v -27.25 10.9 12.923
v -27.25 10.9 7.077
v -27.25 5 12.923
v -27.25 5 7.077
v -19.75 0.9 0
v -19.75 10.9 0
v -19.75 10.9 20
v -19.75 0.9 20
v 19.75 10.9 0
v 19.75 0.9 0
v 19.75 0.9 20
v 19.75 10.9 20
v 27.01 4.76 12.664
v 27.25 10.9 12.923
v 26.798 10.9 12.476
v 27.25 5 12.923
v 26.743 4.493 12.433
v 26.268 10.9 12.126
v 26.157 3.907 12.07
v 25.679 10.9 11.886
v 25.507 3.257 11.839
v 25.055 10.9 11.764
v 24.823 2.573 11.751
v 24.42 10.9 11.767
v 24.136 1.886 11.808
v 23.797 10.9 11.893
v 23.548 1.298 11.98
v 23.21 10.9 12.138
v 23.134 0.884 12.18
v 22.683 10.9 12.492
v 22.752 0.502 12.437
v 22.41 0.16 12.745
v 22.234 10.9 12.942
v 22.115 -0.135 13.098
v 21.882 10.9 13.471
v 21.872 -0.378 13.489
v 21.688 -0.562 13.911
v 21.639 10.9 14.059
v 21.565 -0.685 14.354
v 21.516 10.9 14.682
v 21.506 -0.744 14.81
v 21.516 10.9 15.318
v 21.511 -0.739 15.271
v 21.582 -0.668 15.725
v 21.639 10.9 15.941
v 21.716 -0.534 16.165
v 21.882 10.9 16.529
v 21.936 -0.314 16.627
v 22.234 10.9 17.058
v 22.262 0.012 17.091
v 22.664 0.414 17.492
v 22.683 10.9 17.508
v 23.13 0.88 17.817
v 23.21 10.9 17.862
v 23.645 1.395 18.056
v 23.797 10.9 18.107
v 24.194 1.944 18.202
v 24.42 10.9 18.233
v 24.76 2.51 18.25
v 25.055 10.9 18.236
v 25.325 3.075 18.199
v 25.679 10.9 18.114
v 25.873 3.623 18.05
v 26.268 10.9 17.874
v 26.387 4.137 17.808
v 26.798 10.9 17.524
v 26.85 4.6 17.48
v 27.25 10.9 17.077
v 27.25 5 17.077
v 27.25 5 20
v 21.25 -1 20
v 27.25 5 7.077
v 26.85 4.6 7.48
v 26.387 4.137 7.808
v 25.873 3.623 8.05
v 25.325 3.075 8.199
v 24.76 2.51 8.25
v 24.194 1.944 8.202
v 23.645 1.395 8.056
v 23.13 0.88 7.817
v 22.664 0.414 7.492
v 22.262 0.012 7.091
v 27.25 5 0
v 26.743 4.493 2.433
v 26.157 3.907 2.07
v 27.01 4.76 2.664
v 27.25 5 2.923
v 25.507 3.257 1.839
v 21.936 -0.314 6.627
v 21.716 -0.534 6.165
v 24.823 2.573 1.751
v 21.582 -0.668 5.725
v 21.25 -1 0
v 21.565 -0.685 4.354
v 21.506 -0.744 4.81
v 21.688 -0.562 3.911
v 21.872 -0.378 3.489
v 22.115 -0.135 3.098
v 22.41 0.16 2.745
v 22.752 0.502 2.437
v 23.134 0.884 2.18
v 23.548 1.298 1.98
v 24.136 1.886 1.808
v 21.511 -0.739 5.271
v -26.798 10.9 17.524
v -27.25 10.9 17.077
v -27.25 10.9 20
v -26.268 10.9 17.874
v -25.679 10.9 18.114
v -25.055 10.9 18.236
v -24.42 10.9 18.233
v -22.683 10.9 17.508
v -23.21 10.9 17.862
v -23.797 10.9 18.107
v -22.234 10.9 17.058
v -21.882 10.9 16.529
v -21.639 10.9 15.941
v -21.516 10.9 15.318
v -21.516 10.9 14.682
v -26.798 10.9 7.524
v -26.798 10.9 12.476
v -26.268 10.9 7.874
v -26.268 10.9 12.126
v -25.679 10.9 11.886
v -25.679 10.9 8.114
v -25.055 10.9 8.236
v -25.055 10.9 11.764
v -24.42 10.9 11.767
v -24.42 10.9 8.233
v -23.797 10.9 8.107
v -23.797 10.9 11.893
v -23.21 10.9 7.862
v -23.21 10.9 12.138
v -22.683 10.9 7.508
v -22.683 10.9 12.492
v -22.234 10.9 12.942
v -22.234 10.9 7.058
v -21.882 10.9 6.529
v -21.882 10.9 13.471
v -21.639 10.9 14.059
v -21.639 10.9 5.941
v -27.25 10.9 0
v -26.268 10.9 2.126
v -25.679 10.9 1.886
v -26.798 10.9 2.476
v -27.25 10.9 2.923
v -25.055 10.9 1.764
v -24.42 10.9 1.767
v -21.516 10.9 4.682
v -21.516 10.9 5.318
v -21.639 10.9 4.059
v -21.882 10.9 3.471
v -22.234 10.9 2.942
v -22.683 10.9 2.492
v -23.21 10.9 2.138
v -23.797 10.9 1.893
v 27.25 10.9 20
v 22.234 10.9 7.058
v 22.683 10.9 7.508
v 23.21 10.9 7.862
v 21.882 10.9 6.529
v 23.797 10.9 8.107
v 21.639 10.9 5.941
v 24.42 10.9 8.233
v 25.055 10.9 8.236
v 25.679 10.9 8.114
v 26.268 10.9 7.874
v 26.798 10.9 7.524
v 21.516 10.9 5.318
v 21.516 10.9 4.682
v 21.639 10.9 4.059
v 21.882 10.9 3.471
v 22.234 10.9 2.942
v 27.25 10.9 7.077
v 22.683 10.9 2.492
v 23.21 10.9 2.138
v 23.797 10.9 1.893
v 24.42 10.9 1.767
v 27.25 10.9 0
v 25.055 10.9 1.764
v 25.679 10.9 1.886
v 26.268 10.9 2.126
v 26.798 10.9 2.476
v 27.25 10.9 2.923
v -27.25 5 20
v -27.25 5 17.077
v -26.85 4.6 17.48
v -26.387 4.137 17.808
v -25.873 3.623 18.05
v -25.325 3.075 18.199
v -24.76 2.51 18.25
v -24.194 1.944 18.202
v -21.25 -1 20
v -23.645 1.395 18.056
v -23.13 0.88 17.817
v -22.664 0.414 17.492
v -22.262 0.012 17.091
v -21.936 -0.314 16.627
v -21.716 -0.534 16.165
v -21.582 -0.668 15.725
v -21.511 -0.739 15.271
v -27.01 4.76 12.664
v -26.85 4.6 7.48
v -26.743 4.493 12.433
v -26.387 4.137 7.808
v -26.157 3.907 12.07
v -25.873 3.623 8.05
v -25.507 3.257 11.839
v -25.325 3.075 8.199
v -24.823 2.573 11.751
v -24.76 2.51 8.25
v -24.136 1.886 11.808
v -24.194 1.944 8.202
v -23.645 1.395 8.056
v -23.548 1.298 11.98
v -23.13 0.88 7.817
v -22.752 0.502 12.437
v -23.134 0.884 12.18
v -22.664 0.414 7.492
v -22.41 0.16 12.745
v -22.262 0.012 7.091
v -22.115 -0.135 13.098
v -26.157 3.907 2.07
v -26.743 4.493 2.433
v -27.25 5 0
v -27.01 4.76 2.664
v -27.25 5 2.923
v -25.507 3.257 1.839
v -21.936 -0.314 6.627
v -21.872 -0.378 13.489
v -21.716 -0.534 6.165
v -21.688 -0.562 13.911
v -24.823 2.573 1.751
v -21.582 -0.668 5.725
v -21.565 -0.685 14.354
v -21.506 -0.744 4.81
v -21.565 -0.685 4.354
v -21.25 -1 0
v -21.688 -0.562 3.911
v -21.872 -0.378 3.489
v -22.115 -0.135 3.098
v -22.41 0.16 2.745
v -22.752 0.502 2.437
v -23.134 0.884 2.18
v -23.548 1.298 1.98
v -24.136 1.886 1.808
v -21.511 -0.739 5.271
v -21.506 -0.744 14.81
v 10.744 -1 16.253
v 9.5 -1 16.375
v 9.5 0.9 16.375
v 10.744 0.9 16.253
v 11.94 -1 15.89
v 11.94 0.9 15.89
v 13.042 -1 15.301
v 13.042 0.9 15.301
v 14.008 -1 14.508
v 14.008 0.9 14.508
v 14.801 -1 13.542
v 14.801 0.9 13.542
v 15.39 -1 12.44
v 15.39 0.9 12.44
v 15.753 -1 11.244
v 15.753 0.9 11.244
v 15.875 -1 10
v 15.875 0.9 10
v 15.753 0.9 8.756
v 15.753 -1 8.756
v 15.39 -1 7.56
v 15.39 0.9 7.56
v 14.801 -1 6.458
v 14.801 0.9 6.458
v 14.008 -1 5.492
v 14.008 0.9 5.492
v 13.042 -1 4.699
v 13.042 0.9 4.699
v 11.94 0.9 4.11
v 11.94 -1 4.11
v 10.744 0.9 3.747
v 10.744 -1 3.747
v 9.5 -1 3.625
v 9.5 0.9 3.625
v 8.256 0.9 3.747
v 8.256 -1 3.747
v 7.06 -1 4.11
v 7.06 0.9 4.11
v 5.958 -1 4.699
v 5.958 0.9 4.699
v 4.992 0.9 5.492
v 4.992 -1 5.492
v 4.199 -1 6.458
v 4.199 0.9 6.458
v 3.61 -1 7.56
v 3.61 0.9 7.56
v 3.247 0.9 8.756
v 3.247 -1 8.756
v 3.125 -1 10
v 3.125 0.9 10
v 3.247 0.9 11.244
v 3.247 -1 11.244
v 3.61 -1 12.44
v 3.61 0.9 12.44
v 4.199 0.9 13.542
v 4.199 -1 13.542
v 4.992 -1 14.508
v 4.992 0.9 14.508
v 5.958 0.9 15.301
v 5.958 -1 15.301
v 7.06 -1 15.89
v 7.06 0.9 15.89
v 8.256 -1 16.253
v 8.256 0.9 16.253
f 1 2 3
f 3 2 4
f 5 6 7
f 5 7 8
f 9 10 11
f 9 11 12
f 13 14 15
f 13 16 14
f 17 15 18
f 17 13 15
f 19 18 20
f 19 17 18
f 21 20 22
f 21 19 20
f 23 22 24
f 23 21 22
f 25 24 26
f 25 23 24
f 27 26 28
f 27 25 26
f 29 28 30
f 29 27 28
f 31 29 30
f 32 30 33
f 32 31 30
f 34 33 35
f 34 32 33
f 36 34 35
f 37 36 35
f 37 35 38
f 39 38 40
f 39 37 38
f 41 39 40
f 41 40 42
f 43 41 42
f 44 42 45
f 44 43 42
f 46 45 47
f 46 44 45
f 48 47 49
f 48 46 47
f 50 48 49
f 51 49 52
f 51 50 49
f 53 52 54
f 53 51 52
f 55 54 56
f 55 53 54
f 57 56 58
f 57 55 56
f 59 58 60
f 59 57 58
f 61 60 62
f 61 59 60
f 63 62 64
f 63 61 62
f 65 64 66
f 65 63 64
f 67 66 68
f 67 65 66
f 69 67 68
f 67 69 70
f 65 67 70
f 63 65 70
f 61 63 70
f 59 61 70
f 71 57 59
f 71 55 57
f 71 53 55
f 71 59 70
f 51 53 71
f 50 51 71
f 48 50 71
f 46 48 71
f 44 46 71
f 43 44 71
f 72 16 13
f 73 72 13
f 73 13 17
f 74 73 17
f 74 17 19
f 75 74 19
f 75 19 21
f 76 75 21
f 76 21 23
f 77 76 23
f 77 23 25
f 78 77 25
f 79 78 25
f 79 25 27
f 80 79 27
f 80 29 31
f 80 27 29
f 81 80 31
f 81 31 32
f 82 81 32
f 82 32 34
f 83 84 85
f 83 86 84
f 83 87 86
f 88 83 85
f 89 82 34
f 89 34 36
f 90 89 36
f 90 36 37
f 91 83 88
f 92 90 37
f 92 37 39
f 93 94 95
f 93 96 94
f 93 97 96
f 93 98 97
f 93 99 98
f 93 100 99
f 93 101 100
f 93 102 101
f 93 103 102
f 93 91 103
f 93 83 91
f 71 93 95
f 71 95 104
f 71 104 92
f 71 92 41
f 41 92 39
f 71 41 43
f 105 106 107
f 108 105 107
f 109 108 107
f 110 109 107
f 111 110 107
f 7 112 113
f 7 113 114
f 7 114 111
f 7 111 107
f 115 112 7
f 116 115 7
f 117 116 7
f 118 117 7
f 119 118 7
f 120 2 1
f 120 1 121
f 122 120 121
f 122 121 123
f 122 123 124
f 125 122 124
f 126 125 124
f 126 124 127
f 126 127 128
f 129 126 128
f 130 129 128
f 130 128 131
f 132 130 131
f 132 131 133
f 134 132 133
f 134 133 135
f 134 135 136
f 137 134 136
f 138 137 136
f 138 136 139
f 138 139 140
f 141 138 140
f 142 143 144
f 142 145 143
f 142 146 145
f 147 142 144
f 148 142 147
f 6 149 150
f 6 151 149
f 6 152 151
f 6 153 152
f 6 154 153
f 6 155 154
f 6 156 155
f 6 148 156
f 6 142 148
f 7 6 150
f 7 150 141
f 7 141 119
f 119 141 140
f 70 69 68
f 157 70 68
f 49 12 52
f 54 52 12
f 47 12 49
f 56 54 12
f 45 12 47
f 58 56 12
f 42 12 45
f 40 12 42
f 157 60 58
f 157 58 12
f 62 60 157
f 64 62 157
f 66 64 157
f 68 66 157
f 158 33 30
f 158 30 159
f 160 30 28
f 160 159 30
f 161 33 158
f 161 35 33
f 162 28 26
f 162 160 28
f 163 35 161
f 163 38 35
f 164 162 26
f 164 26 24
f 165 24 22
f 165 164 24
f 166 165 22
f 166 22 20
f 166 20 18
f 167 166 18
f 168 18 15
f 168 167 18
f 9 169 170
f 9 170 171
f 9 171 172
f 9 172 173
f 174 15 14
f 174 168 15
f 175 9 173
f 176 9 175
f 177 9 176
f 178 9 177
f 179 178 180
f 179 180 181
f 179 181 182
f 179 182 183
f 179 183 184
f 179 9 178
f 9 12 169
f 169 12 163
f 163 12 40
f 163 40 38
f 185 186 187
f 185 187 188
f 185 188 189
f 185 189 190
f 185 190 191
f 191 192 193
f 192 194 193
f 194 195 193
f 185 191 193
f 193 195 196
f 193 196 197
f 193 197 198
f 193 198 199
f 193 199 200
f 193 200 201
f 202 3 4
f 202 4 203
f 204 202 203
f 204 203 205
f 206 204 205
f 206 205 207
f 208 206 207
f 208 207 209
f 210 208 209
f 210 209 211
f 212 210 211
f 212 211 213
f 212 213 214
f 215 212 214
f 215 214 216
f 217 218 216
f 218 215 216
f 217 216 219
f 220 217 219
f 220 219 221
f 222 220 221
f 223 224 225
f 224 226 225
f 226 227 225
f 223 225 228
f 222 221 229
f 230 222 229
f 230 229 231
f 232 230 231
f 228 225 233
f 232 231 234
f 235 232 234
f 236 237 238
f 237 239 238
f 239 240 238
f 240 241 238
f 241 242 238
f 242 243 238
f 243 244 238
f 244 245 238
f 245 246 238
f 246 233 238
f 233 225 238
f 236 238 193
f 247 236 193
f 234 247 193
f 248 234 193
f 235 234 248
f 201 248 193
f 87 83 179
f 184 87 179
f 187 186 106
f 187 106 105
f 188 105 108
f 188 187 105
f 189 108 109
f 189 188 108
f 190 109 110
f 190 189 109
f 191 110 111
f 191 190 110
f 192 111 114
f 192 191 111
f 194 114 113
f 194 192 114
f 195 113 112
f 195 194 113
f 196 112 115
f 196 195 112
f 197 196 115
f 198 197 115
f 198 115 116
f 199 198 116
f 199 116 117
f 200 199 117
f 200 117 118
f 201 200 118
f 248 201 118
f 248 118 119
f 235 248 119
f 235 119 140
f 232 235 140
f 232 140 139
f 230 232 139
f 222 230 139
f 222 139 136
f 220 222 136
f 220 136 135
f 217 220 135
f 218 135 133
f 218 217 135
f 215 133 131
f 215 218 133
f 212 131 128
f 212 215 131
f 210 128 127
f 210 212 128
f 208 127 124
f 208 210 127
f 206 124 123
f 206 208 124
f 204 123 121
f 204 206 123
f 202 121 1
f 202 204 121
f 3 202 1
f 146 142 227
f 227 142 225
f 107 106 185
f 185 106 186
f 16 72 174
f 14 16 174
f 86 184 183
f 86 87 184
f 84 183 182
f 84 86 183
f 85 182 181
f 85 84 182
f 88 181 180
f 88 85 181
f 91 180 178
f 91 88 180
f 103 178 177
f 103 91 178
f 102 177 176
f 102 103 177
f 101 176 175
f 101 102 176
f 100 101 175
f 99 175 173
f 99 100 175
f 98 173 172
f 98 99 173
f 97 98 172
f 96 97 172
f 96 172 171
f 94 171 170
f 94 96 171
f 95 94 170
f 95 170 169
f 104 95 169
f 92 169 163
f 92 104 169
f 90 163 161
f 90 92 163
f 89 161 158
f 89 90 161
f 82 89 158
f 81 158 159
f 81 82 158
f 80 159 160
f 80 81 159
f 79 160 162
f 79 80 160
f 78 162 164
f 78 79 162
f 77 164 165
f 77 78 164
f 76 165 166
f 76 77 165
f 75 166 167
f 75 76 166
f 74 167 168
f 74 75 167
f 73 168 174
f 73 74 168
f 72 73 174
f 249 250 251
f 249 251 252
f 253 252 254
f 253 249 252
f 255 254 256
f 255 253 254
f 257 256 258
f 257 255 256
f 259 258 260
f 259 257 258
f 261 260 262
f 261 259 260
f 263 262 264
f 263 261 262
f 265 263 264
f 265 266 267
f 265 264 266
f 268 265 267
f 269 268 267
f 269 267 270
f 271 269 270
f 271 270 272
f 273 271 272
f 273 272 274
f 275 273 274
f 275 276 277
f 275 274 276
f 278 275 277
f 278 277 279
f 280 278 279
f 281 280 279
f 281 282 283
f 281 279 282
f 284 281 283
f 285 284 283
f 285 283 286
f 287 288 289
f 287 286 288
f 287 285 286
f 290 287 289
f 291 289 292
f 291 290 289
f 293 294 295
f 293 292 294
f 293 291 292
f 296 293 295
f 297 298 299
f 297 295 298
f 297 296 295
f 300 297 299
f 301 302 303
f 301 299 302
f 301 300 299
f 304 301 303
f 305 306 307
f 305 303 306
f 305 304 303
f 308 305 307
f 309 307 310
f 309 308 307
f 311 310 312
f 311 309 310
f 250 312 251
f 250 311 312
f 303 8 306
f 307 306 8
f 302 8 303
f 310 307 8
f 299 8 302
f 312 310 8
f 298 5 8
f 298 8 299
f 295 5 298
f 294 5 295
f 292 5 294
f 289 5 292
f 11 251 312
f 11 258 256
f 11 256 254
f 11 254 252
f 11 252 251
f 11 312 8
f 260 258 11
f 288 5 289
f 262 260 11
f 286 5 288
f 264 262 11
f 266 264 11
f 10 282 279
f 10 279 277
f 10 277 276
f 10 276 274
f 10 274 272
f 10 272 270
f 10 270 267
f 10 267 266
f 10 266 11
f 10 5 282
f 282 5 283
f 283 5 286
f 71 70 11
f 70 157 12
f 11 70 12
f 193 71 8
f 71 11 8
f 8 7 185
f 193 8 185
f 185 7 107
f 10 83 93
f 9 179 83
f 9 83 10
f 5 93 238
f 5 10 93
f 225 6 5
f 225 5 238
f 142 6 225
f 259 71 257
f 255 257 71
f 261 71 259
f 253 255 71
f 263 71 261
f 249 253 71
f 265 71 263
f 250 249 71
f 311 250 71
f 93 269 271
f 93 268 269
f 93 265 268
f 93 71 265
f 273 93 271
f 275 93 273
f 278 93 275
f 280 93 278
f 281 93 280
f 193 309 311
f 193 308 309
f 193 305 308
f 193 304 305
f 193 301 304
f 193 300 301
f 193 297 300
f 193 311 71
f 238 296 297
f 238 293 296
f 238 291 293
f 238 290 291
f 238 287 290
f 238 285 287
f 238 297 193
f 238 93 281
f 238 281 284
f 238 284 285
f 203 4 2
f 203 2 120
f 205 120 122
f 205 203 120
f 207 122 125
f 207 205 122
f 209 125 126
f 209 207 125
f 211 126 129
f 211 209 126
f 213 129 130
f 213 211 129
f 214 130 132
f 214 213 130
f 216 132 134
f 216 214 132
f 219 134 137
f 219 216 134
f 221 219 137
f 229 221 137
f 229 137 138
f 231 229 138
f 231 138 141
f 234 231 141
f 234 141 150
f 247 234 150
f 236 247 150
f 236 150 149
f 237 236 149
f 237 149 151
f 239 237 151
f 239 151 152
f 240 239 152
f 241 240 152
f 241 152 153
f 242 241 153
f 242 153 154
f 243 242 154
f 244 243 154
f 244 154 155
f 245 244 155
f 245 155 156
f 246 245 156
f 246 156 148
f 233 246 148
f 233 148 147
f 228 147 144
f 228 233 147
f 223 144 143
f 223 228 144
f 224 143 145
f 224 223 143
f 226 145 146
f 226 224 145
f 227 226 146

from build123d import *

# Parameters (mm, degrees)
BOSS_EXTRUDE1_DEPTH     = 20
CUT_EXTRUDE2_DEPTH      = 36.51580634
CUT_EXTRUDE2_DEPTH_BACK = 36.51580634
SKETCH2_R               = 3.25
CHAMFER1_SIZE           = 6
CUT_EXTRUDE3_DEPTH      = 36.51580634
CUT_EXTRUDE3_DEPTH_BACK = 36.51580634
SKETCH3_R               = 6.375


with BuildPart() as part:
    # Sketch1 → Boss-Extrude1 (new body)
    with BuildSketch(Plane.XY):
        Polygon((-27.25, 1), (-27.25, 10.9), (-19.75, 10.9), (-19.75, 0.9), (19.75, 0.9), (19.75, 10.9), (27.25, 10.9), (27.25, 1), (27.25, -1), (-27.25, -1), align=None)
    extrude(amount=BOSS_EXTRUDE1_DEPTH)

    # Sketch2 → Cut-Extrude2 (cut, two sides: drawn at the far end of the back side and taken through both)
    with BuildSketch(Plane(origin=(0, 0, 0), x_dir=(1, 0, 0), z_dir=(0, 1, 0)).offset(-CUT_EXTRUDE2_DEPTH_BACK)):
        with Locations((-24.75, -5)):
            Circle(SKETCH2_R)
        with Locations((24.75, -5)):
            Circle(SKETCH2_R)
        with Locations((24.75, -15)):
            Circle(SKETCH2_R)
        with Locations((-24.75, -15)):
            Circle(SKETCH2_R)
    extrude(amount=CUT_EXTRUDE2_DEPTH + CUT_EXTRUDE2_DEPTH_BACK, mode=Mode.SUBTRACT)

    # Chamfer1
    # the kernel refuses this chamfer: 6 mm, written as the material it takes off along each edge
    with BuildSketch(Plane(origin=(-27.25, -1, -15.430097928), x_dir=(-0.027495876610586206, 0.9996219169112968, 0), z_dir=(0, 0, 1))) as chamfer1_piece_1:
        Polygon((CHAMFER1_SIZE * 0.999621916911, -CHAMFER1_SIZE * 0.0274958766106), (-CHAMFER1_SIZE * 0.0274958766106, -CHAMFER1_SIZE * 0.999621916911), (0, 0), align=None)
    extrude(amount=33.78353989, mode=Mode.SUBTRACT)
    with BuildSketch(Plane(origin=(-27.25, -1, -8.353441962), x_dir=(-0.027495876610586206, 0.9996219169112968, 0), z_dir=(0, 0, 1))) as chamfer1_piece_2:
        Polygon((CHAMFER1_SIZE * 0.999621916911, -CHAMFER1_SIZE * 0.0274958766106), (-CHAMFER1_SIZE * 0.0274958766106, -CHAMFER1_SIZE * 0.999621916911), (0, 0), align=None)
    extrude(amount=36.706883924, mode=Mode.SUBTRACT)
    with BuildSketch(Plane(origin=(27.25, -1, -15.430097928), x_dir=(0.027495876610586202, 0.9996219169112968, 0), z_dir=(0, 0, 1)), Plane(origin=(27.25, -1, 1.646558038), x_dir=(0.027495876610586202, 0.9996219169112968, 0), z_dir=(0, 0, 1))) as chamfer1_piece_3:
        Polygon((CHAMFER1_SIZE * 0.999621916911, CHAMFER1_SIZE * 0.0274958766106), (-CHAMFER1_SIZE * 0.0274958766106, CHAMFER1_SIZE * 0.999621916911), (0, 0), align=None)
    extrude(amount=33.78353989, mode=Mode.SUBTRACT)
    with BuildSketch(Plane(origin=(27.25, -1, -8.353441962), x_dir=(0.027495876610586202, 0.9996219169112968, 0), z_dir=(0, 0, 1))) as chamfer1_piece_4:
        Polygon((CHAMFER1_SIZE * 0.999621916911, CHAMFER1_SIZE * 0.0274958766106), (-CHAMFER1_SIZE * 0.0274958766106, CHAMFER1_SIZE * 0.999621916911), (0, 0), align=None)
    extrude(amount=36.706883924, mode=Mode.SUBTRACT)

    # Sketch3 → Cut-Extrude3 (cut, two sides: drawn at the far end of the back side and taken through both)
    with BuildSketch(Plane(origin=(0, 0, 0), x_dir=(1, 0, 0), z_dir=(0, 1, 0)).offset(-CUT_EXTRUDE3_DEPTH_BACK)):
        with Locations(Location((9.5, -10, 0), (0, 0, 270))):
            Circle(SKETCH3_R)
    extrude(amount=CUT_EXTRUDE3_DEPTH + CUT_EXTRUDE3_DEPTH_BACK, mode=Mode.SUBTRACT)


solid = part.part
